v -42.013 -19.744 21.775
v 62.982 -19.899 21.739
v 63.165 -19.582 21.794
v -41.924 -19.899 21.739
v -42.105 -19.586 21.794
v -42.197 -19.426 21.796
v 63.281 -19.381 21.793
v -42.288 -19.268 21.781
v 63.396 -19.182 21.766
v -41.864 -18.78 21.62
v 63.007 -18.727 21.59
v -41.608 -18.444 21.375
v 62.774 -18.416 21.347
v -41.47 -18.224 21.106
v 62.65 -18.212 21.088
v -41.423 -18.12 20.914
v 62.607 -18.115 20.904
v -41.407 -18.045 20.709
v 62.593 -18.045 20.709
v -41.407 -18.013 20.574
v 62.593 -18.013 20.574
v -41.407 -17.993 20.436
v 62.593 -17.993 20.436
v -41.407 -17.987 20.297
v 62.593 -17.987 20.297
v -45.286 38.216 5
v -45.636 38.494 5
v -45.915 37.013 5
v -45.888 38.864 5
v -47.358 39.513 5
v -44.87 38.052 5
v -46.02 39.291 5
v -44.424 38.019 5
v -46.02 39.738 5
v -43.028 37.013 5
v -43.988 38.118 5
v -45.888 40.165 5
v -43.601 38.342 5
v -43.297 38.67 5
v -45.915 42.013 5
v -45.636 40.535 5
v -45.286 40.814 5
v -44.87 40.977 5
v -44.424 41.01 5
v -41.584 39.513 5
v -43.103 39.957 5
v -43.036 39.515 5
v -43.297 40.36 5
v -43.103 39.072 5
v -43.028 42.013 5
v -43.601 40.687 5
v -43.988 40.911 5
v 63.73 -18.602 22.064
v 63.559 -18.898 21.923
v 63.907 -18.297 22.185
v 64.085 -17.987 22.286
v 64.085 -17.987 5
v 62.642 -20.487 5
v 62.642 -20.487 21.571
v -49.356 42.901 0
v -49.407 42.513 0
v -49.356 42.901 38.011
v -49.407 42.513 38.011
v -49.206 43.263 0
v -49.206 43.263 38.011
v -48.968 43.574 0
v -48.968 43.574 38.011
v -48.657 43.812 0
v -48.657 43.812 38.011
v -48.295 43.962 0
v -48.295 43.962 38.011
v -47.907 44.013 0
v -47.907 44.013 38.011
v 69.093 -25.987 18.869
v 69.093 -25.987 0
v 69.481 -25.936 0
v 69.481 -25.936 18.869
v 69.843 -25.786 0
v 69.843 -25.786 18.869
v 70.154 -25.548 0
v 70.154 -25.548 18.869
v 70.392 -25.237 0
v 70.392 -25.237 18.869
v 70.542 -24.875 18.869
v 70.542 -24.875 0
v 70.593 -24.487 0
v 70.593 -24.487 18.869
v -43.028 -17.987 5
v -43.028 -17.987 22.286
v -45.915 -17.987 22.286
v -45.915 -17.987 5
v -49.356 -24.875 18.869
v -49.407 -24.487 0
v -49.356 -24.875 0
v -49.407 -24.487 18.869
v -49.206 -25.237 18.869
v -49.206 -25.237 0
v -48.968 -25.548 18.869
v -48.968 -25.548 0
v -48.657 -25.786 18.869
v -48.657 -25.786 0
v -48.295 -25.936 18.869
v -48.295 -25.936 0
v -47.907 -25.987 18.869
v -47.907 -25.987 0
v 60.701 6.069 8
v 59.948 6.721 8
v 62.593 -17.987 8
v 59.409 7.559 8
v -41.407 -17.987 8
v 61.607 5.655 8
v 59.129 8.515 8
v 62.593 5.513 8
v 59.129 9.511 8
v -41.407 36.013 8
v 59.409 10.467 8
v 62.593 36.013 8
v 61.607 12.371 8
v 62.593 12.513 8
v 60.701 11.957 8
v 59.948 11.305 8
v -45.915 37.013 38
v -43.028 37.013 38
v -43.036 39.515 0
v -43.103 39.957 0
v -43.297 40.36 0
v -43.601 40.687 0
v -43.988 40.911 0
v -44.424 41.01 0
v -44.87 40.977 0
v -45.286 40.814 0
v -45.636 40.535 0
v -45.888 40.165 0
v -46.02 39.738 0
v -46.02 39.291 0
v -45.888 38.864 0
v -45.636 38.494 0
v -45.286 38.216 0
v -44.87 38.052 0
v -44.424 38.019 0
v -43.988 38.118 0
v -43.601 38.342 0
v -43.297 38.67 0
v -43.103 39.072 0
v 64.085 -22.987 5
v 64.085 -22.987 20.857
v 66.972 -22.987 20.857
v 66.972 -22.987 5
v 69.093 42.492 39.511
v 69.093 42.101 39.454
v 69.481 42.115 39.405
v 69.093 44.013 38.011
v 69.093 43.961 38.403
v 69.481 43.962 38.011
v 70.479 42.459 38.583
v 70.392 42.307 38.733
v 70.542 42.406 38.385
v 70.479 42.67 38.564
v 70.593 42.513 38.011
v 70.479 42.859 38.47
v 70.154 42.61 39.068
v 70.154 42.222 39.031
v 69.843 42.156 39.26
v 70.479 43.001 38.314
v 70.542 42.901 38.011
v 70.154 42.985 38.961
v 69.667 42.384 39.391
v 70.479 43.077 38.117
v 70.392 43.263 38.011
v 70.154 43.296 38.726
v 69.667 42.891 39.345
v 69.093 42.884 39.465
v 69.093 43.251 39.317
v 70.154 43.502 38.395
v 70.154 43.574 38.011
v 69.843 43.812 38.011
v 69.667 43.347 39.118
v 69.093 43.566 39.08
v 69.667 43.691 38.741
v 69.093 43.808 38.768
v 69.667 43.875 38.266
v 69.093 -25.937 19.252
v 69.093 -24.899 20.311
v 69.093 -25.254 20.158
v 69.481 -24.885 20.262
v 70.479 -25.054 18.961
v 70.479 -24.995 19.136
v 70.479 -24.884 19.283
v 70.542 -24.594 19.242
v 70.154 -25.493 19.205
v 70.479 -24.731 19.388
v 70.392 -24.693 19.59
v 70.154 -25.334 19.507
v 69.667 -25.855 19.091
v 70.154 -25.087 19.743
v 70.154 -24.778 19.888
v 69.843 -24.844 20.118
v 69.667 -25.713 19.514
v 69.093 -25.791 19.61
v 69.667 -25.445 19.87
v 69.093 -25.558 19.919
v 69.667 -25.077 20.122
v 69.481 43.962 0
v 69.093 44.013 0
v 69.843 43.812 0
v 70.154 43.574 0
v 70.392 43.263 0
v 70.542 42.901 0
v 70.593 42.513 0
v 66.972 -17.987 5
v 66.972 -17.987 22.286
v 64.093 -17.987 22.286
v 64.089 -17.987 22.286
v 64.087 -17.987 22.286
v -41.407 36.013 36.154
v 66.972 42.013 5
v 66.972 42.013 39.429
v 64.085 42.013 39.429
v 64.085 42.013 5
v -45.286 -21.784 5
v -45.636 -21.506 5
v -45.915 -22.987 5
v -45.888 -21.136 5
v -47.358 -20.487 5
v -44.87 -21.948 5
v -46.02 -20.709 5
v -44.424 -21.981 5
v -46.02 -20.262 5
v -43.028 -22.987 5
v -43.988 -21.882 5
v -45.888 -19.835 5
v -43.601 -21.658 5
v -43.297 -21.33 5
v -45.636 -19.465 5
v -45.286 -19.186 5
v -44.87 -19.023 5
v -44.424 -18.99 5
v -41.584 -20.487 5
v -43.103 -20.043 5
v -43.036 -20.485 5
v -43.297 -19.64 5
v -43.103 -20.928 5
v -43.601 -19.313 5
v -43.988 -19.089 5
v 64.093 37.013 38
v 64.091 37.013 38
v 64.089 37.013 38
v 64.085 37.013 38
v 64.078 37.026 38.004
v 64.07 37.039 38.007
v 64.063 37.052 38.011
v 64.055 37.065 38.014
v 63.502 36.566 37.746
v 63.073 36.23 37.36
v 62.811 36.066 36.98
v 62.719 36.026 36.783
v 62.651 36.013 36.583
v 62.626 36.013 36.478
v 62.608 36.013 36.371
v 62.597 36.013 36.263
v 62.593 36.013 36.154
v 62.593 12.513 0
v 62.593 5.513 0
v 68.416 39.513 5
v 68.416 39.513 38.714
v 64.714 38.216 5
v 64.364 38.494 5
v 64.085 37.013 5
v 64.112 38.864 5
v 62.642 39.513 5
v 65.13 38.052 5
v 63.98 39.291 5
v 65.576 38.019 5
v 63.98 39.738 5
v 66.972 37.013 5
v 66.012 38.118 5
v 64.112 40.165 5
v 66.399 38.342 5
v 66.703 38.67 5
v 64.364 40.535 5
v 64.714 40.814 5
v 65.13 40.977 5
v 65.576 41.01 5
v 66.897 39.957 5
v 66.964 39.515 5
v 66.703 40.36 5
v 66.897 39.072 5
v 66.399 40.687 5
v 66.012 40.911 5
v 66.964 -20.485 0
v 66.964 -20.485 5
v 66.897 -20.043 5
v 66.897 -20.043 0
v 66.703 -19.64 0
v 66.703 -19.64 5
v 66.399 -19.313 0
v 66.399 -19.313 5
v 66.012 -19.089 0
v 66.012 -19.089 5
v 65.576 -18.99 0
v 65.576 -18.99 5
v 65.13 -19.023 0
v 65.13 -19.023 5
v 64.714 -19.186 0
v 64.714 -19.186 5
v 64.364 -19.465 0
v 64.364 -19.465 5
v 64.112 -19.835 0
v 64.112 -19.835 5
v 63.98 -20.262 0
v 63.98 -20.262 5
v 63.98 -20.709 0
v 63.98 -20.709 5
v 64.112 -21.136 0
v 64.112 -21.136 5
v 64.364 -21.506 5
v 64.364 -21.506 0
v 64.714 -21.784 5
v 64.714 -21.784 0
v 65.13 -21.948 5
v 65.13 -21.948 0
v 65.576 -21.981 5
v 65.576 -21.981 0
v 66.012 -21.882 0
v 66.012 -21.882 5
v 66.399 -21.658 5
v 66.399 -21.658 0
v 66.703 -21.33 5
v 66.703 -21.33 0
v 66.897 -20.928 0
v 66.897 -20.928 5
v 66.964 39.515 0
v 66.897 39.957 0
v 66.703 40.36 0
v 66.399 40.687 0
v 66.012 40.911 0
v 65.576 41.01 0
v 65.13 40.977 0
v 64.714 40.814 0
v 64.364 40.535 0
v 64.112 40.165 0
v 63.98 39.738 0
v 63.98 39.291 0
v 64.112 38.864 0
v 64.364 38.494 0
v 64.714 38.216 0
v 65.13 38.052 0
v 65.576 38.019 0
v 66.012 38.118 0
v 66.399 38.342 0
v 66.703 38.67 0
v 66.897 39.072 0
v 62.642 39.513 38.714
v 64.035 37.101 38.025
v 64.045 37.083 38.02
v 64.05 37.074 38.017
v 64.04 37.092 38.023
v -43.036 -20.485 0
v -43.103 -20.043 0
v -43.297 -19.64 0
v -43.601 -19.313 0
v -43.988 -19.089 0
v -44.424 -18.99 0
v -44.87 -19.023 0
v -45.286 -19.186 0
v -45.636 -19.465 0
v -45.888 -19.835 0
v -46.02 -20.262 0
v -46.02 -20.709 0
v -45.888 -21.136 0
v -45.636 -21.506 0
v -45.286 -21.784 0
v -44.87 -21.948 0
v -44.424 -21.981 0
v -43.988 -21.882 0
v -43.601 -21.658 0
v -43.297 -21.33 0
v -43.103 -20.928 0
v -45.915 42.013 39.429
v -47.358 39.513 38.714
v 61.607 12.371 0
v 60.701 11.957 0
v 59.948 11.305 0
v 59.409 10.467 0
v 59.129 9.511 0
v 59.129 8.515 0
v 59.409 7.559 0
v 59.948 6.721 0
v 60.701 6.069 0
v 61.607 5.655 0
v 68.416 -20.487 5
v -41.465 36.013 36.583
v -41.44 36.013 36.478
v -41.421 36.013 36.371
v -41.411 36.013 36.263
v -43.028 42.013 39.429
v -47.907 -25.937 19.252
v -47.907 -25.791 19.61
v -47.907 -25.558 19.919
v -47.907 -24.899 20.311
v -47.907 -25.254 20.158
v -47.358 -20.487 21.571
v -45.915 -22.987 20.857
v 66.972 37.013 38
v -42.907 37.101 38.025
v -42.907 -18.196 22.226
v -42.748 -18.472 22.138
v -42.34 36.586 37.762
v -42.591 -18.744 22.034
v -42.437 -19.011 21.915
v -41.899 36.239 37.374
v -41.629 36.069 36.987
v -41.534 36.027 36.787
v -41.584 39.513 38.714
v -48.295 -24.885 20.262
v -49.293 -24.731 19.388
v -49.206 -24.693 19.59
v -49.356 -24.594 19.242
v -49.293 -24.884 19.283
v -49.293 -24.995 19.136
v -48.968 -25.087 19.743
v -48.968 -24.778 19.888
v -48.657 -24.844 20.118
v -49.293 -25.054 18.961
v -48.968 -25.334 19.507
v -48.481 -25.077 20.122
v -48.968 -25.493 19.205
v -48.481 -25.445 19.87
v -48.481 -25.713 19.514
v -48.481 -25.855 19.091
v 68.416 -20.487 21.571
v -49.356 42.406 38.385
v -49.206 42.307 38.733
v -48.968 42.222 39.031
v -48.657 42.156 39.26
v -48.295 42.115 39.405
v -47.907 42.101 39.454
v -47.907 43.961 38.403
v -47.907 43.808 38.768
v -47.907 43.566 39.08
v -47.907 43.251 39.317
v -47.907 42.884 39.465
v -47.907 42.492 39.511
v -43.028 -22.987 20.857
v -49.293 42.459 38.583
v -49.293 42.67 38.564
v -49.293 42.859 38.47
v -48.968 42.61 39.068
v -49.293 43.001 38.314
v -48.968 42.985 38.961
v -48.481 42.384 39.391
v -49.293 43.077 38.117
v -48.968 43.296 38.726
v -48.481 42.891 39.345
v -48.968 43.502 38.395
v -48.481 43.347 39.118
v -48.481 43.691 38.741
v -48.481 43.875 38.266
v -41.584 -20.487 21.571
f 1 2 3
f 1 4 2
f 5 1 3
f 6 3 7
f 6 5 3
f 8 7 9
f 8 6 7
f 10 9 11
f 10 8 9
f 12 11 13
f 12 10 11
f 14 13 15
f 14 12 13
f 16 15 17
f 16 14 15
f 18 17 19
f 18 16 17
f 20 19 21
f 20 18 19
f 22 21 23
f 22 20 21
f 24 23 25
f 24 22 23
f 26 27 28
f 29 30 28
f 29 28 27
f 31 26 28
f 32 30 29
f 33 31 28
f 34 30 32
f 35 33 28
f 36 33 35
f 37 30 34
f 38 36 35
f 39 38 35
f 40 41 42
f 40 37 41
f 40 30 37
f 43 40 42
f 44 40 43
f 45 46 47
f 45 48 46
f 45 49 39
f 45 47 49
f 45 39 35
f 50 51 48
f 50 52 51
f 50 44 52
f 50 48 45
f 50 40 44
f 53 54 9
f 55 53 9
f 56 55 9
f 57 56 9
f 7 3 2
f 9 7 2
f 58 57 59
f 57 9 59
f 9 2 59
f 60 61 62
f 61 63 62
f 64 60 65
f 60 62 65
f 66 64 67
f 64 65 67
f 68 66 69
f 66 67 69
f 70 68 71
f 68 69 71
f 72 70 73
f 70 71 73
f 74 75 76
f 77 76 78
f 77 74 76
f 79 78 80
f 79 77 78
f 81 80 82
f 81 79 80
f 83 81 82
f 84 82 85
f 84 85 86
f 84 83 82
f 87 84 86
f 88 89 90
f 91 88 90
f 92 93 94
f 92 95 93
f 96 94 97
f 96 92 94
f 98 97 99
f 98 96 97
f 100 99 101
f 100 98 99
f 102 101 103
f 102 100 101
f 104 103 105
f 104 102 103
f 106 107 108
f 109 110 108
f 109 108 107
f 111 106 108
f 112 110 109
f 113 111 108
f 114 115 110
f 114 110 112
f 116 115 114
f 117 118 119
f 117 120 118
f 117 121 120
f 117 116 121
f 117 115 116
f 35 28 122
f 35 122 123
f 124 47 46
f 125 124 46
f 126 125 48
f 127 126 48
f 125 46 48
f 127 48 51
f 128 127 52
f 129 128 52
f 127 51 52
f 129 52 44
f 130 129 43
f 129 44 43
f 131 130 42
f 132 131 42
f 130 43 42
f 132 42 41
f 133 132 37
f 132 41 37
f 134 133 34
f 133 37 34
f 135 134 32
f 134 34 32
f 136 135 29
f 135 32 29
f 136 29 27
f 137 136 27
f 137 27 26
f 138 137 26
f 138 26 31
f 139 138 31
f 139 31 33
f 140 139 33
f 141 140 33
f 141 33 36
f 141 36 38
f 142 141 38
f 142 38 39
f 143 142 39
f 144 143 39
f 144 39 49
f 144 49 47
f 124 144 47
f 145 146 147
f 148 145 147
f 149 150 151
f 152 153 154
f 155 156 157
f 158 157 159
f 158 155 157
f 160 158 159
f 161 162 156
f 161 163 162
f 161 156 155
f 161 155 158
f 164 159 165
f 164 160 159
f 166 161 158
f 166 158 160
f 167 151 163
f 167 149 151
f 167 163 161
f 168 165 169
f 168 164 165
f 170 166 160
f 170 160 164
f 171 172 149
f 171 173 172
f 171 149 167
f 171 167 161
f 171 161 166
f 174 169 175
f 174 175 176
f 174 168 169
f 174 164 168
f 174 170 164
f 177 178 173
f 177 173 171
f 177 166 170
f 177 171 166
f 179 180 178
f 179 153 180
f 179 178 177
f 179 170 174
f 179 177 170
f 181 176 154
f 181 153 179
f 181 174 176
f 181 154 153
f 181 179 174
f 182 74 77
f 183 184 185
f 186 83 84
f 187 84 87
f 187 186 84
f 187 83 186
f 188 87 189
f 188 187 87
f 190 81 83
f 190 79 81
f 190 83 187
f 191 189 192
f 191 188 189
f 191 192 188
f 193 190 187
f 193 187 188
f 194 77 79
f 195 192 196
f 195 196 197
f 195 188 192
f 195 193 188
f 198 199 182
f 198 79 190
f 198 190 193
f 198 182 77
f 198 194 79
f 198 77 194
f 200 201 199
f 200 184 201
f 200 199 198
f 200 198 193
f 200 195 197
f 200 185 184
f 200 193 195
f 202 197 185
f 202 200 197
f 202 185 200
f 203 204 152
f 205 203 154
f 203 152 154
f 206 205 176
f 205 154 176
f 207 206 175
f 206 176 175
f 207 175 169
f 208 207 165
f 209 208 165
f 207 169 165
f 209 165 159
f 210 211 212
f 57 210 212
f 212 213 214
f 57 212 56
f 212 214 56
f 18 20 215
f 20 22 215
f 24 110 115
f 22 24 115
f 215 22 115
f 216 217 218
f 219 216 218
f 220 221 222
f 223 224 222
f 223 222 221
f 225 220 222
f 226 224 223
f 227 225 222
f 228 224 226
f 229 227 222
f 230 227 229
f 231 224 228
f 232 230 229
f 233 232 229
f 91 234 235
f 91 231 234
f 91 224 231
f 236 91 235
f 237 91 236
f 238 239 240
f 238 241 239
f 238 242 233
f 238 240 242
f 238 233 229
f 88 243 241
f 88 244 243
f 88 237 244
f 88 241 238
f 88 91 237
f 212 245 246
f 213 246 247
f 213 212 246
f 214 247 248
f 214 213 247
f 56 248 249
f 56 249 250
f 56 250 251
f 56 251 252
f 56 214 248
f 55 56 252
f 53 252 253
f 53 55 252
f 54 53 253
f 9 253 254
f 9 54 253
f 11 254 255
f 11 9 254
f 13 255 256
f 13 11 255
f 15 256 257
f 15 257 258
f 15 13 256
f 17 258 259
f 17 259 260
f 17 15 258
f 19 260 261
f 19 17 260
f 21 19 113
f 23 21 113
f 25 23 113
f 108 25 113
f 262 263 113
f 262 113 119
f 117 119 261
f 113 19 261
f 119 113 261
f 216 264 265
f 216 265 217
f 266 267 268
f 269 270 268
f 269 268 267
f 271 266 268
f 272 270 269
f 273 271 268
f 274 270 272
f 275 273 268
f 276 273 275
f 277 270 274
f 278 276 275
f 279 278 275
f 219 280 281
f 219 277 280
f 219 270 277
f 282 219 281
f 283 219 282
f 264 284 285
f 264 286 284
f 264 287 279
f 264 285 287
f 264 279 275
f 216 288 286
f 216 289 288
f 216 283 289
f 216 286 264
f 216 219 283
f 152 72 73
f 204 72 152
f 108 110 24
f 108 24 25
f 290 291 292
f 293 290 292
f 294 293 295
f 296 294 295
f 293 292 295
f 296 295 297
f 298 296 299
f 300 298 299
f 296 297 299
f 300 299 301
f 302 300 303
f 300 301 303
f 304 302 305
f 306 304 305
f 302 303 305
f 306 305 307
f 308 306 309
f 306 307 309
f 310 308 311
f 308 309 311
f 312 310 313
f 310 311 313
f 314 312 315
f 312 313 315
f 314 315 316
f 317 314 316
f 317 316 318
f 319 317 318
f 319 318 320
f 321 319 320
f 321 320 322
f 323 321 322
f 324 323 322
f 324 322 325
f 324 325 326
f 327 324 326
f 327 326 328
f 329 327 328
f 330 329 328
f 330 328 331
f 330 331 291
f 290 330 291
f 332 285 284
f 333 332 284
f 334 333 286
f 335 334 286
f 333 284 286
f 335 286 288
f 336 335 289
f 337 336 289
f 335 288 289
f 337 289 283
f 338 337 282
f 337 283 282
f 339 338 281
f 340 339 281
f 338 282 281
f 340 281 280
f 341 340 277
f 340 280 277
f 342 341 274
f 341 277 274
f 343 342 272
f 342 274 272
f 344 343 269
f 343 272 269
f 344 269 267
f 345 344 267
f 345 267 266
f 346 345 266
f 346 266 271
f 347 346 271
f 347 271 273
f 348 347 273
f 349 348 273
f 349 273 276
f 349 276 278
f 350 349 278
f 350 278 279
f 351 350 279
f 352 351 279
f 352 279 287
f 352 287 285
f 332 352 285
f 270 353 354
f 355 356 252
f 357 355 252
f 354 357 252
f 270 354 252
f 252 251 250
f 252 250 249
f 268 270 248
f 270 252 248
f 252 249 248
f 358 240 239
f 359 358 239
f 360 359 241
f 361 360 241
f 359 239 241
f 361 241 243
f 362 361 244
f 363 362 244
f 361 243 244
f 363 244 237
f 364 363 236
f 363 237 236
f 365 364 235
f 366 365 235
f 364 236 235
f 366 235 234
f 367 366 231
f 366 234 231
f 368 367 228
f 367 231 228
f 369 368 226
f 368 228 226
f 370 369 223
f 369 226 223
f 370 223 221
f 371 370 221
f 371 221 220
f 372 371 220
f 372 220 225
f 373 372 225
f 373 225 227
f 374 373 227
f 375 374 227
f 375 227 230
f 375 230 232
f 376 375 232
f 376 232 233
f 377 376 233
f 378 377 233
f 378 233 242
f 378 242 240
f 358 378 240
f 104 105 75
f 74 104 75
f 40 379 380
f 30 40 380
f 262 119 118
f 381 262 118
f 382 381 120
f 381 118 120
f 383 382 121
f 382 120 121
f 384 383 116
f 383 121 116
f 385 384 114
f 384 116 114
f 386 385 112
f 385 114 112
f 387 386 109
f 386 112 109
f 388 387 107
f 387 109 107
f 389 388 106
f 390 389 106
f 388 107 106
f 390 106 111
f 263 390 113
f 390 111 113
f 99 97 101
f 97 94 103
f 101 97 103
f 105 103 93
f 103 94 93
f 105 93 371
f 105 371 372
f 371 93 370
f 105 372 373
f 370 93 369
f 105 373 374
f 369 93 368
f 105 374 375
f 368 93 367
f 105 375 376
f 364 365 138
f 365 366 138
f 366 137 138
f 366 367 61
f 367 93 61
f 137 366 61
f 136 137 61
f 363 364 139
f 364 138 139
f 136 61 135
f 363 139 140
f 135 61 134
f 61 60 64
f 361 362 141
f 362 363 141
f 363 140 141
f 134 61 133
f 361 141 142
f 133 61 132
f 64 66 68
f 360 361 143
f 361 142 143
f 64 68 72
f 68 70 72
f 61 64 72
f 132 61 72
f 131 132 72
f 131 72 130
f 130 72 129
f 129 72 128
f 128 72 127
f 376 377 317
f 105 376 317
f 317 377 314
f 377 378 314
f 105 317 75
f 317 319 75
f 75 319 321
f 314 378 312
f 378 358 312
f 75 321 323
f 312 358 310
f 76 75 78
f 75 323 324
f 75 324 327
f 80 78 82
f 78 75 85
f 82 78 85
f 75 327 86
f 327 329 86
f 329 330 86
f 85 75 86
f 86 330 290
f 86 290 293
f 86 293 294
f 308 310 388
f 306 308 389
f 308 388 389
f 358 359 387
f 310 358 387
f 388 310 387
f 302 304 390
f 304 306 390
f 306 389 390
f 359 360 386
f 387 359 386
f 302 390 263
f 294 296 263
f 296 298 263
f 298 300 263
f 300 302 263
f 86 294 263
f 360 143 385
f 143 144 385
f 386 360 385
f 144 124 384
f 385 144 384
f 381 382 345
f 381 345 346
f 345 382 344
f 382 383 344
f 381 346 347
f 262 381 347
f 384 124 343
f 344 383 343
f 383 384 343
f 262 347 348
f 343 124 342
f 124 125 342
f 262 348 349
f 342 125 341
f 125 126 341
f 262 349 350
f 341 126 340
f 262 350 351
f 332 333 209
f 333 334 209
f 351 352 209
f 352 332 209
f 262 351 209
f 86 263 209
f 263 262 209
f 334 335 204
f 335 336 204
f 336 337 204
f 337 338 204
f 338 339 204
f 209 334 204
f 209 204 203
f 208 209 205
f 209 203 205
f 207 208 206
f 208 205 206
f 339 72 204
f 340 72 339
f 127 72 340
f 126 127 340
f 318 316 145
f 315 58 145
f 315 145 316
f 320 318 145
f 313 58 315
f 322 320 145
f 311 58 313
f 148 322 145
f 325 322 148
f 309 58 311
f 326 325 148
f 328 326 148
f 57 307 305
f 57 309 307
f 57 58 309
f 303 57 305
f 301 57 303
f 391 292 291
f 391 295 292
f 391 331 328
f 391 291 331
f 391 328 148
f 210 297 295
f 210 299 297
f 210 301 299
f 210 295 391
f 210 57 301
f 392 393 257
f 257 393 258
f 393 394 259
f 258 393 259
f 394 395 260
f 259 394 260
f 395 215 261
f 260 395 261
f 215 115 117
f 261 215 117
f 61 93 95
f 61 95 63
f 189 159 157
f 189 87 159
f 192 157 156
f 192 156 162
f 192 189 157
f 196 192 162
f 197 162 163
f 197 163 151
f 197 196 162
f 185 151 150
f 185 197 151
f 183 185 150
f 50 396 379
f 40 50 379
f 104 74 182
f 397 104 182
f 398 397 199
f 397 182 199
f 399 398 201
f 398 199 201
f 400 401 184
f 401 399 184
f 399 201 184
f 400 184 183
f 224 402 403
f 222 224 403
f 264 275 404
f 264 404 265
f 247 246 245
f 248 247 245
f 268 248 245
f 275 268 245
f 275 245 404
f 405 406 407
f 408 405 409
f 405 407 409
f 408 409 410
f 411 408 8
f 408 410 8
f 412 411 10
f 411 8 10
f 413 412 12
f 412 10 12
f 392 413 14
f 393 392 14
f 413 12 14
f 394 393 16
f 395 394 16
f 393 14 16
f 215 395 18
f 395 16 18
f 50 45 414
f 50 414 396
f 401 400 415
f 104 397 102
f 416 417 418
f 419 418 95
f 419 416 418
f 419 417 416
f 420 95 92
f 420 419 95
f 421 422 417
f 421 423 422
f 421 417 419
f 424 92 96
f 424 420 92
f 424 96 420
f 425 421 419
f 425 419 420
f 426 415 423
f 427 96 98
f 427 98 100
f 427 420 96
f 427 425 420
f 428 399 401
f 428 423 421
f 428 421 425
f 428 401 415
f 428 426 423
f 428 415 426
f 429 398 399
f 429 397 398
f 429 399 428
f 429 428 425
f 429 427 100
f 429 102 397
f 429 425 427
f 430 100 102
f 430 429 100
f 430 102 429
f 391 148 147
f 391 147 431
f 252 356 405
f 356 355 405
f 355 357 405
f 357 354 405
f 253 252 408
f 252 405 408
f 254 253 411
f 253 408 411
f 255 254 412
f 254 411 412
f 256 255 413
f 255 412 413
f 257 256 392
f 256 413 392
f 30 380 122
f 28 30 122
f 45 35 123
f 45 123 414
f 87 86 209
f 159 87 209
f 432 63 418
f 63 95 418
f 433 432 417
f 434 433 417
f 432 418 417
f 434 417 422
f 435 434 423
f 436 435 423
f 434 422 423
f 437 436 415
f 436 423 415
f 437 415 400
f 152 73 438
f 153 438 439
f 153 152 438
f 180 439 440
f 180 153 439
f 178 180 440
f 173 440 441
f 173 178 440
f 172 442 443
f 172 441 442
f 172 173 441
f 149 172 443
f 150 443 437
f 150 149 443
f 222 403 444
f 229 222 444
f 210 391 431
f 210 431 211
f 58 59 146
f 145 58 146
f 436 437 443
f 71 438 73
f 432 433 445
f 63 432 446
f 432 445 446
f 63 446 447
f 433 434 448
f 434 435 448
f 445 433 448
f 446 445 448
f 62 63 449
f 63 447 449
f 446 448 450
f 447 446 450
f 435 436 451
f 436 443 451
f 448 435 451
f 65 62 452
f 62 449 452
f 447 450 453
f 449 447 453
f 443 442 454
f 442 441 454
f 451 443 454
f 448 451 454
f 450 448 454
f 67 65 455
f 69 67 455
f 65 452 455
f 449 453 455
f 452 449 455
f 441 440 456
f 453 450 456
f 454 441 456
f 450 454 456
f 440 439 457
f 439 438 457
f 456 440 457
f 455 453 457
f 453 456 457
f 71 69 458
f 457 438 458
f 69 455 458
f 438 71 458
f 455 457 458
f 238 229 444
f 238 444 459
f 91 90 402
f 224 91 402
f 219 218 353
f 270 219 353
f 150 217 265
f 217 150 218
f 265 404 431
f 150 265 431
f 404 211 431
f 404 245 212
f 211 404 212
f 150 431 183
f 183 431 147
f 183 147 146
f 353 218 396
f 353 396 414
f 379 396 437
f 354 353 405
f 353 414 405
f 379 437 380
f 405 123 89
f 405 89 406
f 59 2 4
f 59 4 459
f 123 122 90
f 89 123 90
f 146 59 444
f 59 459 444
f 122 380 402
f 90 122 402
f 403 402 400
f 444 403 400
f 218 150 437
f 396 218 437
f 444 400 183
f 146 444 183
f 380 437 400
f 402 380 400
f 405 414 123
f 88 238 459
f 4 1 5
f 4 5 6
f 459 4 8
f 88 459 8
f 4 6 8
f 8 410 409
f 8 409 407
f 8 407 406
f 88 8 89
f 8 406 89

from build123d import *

# Parameters (mm, degrees)
F0_W      = 120
F0_H      = 70
F1_DEPTH  = 40
F3_DEPTH  = 120.001
F4_T      = -8
F5_R      = 1.5
F8_DEPTH  = 35
F9_R      = 1.5
F10_DEPTH = 40.001
F12_DEPTH = 25


with BuildPart() as f1:
    # F0 (on Top) → F1 (new body)
    with BuildSketch(Plane.XY):
        with Locations((10.593040958, 9.0129598636)):
            Rectangle(F0_W, F0_H)
    extrude(amount=F1_DEPTH)

    # F2 (on face) → F3 (cut, through all)
    with BuildSketch(Plane(origin=(-49.406959042, 0, 0), x_dir=(0, -1, 0), z_dir=(-1, 0, 0))):
        Polygon((25.9870401364, 40), (-44.0129598636, 40), (25.9870401364, 20), align=None)
    extrude(amount=-F3_DEPTH, mode=Mode.SUBTRACT)

    # F4
    f4_openings = [f1.faces().sort_by_distance(p)[0] for p in [
        (10.593041, 9.01296, 30),
    ]]
    offset(amount=F4_T, openings=f4_openings)

    # F5
    f5_edges = [f1.edges().sort_by_distance(p)[0] for p in [
        (-49.406959, -25.98704, 10),
        (-49.406959, 44.01296, 20),
        (70.593041, 44.01296, 20),
        (70.593041, -25.98704, 10),
        (10.593041, 44.01296, 40),
        (70.593041, 9.01296, 30),
        (10.593041, -25.98704, 20),
        (-49.406959, 9.01296, 30),
        (10.593041, -17.98704, 22.285714),
        (62.593041, 9.01296, 30),
        (10.593041, 36.01296, 37.714286),
        (-41.406959, 9.01296, 30),
    ]]
    fillet(f5_edges, radius=F5_R)

    # F7 (on offset) → F8 (cut)
    with BuildSketch(Plane.XY.offset(40)):
        Polygon((-43.0277708034, 37.0129598636), (-41.5843951305, 39.5129598636), (-43.0277708034, 42.0129598636), (-45.9145221494, 42.0129598636), (-47.3578978224, 39.5129598636), (-45.9145221494, 37.0129598636), align=None)
        Polygon((66.9722291966, 37.0129598636), (68.4156048695, 39.5129598636), (66.9722291966, 42.0129598636), (64.0854778506, 42.0129598636), (62.6421021776, 39.5129598636), (64.0854778506, 37.0129598636), align=None)
        Polygon((-43.0277708034, -22.9870401364), (-41.5843951305, -20.4870401364), (-43.0277708034, -17.9870401364), (-45.9145221494, -17.9870401364), (-47.3578978224, -20.4870401364), (-45.9145221494, -22.9870401364), align=None)
        Polygon((66.9722291966, -22.9870401364), (68.4156048695, -20.4870401364), (66.9722291966, -17.9870401364), (64.0854778506, -17.9870401364), (62.6421021776, -20.4870401364), (64.0854778506, -22.9870401364), align=None)
    extrude(amount=-F8_DEPTH, mode=Mode.SUBTRACT)

    # F9 (on offset) → F10 (cut, through all)
    with BuildSketch(Plane.XY.offset(40)):
        with Locations((-44.5364899848, 39.5145639777)):
            Circle(F9_R)
        with Locations((65.4635100152, 39.5145639777)):
            Circle(F9_R)
        with Locations((65.4635100152, -20.4854360223)):
            Circle(F9_R)
        with Locations((-44.5364899848, -20.4854360223)):
            Circle(F9_R)
    extrude(amount=-F10_DEPTH, mode=Mode.SUBTRACT)

    # F11 (on face) → F12 (cut)
    with BuildSketch(Plane.XY.offset(8)):
        with BuildLine():
            Line((62.593040958, 5.5129598636), (62.593040958, 12.5129598636))
            ThreePointArc((62.593040958, 12.5129598636), (59.093040958, 9.0129598636), (62.593040958, 5.5129598636))
        make_face()
    extrude(amount=-F12_DEPTH, mode=Mode.SUBTRACT)


solid = f1.part
